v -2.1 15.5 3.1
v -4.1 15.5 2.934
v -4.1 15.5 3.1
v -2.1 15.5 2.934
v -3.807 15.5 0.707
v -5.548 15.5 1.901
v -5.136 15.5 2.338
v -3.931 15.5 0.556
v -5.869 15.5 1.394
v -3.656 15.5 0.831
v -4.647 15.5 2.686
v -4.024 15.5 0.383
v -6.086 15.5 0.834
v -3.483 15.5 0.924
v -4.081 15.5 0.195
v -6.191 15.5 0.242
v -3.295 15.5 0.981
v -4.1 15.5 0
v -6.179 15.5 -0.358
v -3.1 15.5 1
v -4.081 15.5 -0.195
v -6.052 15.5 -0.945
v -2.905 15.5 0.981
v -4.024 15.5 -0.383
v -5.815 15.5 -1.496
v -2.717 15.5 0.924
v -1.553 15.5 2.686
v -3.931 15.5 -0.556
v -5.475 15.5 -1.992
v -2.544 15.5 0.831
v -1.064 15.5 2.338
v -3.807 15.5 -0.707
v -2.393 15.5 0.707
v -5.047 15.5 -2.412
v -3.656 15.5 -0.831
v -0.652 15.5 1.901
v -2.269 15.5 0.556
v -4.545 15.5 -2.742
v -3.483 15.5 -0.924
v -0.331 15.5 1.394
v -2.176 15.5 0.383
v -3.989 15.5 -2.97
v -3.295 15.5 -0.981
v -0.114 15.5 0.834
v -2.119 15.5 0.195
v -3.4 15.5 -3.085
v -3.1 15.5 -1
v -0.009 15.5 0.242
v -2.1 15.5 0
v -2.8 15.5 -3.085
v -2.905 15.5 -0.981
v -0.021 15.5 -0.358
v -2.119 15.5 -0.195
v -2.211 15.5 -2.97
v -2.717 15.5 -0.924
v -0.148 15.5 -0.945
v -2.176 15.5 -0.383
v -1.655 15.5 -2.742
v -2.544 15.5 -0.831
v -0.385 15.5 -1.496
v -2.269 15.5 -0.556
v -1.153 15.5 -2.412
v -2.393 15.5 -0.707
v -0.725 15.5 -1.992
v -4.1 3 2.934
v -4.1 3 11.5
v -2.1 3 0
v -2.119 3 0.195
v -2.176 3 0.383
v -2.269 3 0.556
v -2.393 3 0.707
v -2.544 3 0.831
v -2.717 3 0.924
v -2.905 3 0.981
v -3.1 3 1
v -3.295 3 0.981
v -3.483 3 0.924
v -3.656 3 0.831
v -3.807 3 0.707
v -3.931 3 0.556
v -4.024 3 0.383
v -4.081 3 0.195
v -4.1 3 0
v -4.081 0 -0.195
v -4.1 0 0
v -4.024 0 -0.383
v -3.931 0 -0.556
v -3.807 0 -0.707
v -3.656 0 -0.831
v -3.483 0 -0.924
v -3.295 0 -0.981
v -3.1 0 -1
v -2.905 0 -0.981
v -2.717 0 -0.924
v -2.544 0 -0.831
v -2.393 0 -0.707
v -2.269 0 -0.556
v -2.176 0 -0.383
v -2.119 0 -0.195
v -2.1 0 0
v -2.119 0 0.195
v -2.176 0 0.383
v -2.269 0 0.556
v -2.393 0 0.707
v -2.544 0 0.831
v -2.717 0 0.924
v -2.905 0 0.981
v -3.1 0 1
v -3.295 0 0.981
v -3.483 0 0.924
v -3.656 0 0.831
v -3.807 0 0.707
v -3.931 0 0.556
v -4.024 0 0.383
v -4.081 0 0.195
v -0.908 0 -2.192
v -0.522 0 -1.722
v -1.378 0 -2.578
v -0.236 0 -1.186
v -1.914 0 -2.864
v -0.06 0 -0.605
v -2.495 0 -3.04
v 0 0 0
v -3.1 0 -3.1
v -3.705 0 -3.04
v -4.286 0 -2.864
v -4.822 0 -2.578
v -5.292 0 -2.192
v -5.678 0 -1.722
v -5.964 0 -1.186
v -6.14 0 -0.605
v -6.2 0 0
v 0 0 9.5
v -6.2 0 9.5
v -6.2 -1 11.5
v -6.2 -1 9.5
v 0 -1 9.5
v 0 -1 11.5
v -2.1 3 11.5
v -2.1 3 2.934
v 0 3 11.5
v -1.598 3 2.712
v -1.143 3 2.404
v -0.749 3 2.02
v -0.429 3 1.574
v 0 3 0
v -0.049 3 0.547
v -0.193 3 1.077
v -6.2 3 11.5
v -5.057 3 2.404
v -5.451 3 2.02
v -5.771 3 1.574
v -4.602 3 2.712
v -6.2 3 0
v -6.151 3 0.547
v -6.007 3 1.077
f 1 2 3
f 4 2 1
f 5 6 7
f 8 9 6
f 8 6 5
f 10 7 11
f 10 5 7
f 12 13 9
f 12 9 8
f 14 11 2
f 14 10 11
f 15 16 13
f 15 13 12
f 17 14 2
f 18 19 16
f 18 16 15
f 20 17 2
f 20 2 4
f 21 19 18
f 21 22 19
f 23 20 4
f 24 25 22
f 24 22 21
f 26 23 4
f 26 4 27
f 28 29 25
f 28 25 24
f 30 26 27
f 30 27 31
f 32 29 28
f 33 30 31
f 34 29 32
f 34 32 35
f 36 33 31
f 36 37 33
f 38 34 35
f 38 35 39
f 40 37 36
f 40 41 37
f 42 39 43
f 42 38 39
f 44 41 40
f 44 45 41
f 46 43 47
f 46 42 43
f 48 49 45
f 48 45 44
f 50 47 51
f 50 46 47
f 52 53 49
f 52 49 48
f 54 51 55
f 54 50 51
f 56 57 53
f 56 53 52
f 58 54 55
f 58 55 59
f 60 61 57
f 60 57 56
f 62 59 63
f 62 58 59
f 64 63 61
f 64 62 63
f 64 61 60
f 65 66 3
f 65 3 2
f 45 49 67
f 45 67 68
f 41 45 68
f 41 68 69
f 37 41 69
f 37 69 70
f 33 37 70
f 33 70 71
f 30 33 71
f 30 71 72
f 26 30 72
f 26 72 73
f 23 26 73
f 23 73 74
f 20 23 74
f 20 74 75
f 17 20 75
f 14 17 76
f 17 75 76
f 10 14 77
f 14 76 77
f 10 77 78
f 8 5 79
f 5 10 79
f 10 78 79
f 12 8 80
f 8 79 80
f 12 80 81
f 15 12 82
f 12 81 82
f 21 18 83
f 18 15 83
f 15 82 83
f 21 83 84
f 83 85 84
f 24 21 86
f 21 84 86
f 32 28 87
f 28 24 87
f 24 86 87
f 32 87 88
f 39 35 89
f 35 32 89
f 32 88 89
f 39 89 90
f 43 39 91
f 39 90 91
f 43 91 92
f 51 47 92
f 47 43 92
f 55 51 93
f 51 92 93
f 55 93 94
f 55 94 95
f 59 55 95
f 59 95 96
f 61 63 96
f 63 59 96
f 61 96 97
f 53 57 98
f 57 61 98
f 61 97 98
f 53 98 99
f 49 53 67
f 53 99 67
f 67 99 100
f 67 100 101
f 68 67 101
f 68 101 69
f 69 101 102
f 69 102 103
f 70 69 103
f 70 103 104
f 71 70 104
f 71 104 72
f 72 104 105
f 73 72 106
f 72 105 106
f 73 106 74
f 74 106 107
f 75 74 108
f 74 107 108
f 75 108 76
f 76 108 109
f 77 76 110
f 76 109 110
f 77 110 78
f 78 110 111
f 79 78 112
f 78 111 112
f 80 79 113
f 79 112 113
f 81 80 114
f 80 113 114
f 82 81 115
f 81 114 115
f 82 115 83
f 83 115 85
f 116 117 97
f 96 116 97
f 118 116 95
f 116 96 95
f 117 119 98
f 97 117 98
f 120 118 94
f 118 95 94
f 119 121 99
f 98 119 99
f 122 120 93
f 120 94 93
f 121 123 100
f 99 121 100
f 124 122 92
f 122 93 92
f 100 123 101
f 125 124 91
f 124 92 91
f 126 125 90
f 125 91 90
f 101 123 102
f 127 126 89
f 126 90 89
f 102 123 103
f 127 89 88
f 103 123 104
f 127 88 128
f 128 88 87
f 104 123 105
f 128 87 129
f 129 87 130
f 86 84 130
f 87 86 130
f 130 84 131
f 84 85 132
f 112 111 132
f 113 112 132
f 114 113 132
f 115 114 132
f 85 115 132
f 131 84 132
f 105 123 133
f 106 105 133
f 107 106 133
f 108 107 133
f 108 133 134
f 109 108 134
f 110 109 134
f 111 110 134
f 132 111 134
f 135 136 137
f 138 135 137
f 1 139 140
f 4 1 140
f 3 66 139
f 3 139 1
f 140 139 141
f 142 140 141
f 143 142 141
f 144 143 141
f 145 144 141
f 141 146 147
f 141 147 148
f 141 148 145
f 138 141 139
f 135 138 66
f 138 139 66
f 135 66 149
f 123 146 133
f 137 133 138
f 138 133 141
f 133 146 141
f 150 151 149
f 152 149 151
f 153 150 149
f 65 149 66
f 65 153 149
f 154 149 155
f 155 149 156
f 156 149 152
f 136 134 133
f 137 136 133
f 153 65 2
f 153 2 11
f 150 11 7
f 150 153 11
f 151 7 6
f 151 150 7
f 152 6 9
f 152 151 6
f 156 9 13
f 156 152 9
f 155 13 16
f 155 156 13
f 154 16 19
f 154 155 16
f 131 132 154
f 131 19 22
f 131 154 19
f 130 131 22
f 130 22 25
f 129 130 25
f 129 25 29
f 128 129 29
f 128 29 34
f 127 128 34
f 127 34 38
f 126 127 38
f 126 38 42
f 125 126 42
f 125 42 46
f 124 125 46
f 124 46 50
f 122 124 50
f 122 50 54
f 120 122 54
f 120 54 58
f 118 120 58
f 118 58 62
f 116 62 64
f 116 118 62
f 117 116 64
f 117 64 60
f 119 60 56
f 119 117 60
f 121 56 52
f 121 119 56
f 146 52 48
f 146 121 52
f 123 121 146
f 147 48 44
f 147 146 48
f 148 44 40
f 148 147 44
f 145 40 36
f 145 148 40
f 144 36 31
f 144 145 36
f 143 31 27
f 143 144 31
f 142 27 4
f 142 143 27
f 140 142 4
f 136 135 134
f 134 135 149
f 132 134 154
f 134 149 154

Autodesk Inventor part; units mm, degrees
ref_plane "YZ Plane" through (0, 0, 0) normal (1, 0, 0) x (0, 1, 0)
ref_plane "XZ Plane" through (0, 0, 0) normal (0, 1, 0) x (-1, 0, 0)
ref_plane "XY Plane" through (0, 0, 0) normal (0, 0, 1) x (1, 0, 0)
sketch "Sketch1" plane through (0, 0, 0) normal (0, 1, 0) x (-1, 0, 0)
  line L0 (0, 0) -> (6.2, 0)
  line L1 (6.2, 0) -> (6.2, 9.5)
  line L2 (6.2, 9.5) -> (0, 9.5)
  line L3 (0, 9.5) -> (0, 0)
  circle A0 centre (3.1, 0) radius 3.1
  circle A1 centre (3.1, 0) radius 1
  dimension "d2" = 6.2
  dimension "d3" = 9.5
  dimension "d4" = 2
extrude "Extrusion1" add sketch "Sketch1" along normal blind 3 contours A1 L0 A0 | L0 A0 A1 | A0 L3 L2 L1
sketch "Sketch2" plane through (0, 3, 0) normal (0, 1, 0) x (1, 0, 0)
  circle A0 centre (-3.1, 0) radius 1 projected
  line L0 (-6.2, 0) -> (-6.2, -9.5) projected
  circle A1 centre (-3.1, 0) radius 3.1
  circle A2 centre (-3.1, 0) radius 1
  point P0 (0, 0)
extrude "Extrusion2" add sketch "Sketch2" along normal blind 12.5
sketch "Sketch3" plane through (0, 3, 0) normal (0, 1, 0) x (1, 0, 0)
  line L0 (-6.2, -9.5) -> (0, -9.5) projected
  line L1 (-6.2, -9.5) -> (0, -9.5)
  line L2 (0, -9.5) -> (0, -11.5)
  line L3 (0, -11.5) -> (-6.2, -11.5)
  line L4 (-6.2, -11.5) -> (-6.2, -9.5)
  point P0 (0, 0)
  dimension "d9" = 2
extrude "Extrusion3" add sketch "Sketch3" against normal blind 4
ref_plane "Work Plane1" through (-3.1, 0, 0) normal (1, 0, 0) x (0, 0, -1)
sketch "Sketch4" plane through (-3.1, 0, 0) normal (1, 0, 0) x (0, 0, -1)
  line L0 (-11.5, 3) -> (0, 3) projected
  line L1 (3.1, 15.5) -> (-3.1, 15.5) projected
  line L2 (-11.5, 3) -> (-3.1, 15.5)
  line L3 (-1, 15.5) -> (1, 15.5) projected
  line L4 (-3.1, 15.5) -> (-1, 15.5)
  line L5 (-1, 15.5) -> (-1, 3)
  line L6 (-11.5, 3) -> (-11.5, -1) projected
  line L7 (-1, 3) -> (-11.5, 3)
  point P0 (0, 0)
extrude "Extrusion4" add sketch "Sketch4" along normal mid plane 2
properties part number "Pi3B_spacer_F"
